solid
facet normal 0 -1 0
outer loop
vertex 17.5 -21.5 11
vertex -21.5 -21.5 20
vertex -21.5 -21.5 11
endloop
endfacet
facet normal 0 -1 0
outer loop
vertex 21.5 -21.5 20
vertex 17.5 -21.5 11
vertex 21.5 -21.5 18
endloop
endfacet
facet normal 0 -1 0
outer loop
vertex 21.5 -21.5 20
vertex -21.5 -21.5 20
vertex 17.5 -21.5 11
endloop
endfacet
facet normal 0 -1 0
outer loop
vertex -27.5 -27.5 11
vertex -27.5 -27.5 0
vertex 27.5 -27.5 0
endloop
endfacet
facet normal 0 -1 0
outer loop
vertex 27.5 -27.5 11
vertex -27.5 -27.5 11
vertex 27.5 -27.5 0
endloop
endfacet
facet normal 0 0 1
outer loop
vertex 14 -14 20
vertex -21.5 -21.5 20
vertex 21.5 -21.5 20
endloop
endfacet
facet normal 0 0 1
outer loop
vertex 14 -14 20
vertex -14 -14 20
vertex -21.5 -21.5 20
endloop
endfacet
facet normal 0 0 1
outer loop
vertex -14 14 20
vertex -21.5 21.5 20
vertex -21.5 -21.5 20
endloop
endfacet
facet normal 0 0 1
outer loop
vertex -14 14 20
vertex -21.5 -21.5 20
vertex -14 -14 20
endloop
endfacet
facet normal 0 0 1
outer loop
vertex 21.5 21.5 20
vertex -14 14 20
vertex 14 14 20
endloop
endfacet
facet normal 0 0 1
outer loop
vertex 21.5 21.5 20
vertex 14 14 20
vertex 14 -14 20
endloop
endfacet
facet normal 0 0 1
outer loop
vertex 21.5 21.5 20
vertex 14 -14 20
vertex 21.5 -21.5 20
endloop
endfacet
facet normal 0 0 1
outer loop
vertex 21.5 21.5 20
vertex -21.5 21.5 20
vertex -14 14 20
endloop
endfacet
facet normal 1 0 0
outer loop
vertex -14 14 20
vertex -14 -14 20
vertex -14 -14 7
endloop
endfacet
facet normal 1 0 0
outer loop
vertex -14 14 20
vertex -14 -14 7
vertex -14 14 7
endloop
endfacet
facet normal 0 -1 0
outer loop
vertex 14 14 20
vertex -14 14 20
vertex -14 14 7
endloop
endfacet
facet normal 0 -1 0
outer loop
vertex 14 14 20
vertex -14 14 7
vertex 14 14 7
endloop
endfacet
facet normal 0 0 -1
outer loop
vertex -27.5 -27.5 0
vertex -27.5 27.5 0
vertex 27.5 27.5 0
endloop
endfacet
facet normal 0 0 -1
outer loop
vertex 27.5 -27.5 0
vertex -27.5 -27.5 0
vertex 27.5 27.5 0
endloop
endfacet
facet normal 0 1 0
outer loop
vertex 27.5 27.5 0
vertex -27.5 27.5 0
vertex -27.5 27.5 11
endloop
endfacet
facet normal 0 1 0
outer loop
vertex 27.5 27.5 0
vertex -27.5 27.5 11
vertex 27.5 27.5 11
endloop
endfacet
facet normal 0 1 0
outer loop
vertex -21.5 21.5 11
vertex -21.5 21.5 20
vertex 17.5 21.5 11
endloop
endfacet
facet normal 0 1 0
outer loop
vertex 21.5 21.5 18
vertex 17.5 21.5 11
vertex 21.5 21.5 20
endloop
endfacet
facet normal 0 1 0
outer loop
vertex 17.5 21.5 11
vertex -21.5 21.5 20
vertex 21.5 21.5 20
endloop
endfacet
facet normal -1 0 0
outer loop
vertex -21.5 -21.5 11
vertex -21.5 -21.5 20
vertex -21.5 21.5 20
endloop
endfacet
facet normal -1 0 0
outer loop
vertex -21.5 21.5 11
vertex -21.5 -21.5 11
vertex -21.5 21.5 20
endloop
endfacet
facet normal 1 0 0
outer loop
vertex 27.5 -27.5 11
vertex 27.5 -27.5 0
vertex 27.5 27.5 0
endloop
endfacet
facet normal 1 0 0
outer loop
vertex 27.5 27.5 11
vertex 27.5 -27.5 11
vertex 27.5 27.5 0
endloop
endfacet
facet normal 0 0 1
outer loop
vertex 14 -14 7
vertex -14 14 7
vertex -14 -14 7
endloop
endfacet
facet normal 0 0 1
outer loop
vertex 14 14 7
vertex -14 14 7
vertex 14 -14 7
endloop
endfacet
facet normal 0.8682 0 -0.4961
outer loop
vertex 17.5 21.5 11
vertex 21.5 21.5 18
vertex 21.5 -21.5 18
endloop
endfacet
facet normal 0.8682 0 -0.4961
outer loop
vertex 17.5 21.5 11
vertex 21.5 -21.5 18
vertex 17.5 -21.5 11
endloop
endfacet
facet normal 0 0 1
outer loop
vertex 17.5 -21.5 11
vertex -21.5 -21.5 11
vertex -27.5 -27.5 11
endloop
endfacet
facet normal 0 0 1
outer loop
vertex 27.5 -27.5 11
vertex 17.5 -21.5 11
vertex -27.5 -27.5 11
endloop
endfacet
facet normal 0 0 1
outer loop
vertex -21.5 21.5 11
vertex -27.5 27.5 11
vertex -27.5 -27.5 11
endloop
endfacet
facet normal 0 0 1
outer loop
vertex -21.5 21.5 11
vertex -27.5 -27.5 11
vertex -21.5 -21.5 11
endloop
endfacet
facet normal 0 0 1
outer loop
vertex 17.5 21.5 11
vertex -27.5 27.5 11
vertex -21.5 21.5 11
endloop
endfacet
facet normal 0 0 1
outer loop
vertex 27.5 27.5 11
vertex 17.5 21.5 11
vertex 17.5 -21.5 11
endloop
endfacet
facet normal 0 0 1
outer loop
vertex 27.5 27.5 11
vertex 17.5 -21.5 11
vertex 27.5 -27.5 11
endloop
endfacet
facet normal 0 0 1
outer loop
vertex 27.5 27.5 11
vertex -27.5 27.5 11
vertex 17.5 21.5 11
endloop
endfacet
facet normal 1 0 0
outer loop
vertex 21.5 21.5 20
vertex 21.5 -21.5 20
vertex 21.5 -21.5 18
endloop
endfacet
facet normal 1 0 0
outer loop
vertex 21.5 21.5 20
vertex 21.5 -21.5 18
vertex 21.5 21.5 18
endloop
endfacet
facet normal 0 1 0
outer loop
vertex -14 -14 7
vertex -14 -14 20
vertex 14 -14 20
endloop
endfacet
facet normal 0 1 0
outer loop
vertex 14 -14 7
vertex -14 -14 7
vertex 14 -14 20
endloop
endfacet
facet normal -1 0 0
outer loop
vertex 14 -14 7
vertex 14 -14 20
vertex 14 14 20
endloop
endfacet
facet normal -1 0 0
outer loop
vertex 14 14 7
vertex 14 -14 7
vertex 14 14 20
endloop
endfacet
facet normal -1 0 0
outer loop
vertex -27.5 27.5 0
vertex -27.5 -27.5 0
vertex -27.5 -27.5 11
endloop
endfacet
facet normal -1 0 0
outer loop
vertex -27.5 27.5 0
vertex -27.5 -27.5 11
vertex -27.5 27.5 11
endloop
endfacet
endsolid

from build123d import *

# Parameters (mm, degrees)
F0_W     = 55
F0_H     = 55
F1_DEPTH = 20
F3_W     = 28
F3_H     = 28
F4_DEPTH = 13
F5_W     = 55
F5_H     = 55
F5_W_2   = 43
F5_H_2   = 43
F6_DEPTH = 9
F8_DEPTH = 22.5


with BuildPart() as f1:
    # F0 (on Top) → F1 (new body)
    with BuildSketch(Plane.XY):
        Rectangle(F0_W, F0_H)
    extrude(amount=F1_DEPTH)

    # F3 (on face) → F4 (cut, through all)
    with BuildSketch(Plane.XY.offset(20)):
        Rectangle(F3_W, F3_H)
    extrude(amount=-F4_DEPTH, mode=Mode.SUBTRACT)

    # F5 (on face) → F6 (cut)
    with BuildSketch(Plane.XY.offset(20)):
        Rectangle(F5_W, F5_H)
        Rectangle(F5_W_2, F5_H_2, mode=Mode.SUBTRACT)
    extrude(amount=-F6_DEPTH, mode=Mode.SUBTRACT)

    # F7 (on Front) → F8 (cut, symmetric)
    with BuildSketch(Plane.XZ):
        Polygon((21.5, 11), (21.5, 18), (17.5, 11), align=None)
    extrude(amount=F8_DEPTH, both=True, mode=Mode.SUBTRACT)


solid = f1.part
